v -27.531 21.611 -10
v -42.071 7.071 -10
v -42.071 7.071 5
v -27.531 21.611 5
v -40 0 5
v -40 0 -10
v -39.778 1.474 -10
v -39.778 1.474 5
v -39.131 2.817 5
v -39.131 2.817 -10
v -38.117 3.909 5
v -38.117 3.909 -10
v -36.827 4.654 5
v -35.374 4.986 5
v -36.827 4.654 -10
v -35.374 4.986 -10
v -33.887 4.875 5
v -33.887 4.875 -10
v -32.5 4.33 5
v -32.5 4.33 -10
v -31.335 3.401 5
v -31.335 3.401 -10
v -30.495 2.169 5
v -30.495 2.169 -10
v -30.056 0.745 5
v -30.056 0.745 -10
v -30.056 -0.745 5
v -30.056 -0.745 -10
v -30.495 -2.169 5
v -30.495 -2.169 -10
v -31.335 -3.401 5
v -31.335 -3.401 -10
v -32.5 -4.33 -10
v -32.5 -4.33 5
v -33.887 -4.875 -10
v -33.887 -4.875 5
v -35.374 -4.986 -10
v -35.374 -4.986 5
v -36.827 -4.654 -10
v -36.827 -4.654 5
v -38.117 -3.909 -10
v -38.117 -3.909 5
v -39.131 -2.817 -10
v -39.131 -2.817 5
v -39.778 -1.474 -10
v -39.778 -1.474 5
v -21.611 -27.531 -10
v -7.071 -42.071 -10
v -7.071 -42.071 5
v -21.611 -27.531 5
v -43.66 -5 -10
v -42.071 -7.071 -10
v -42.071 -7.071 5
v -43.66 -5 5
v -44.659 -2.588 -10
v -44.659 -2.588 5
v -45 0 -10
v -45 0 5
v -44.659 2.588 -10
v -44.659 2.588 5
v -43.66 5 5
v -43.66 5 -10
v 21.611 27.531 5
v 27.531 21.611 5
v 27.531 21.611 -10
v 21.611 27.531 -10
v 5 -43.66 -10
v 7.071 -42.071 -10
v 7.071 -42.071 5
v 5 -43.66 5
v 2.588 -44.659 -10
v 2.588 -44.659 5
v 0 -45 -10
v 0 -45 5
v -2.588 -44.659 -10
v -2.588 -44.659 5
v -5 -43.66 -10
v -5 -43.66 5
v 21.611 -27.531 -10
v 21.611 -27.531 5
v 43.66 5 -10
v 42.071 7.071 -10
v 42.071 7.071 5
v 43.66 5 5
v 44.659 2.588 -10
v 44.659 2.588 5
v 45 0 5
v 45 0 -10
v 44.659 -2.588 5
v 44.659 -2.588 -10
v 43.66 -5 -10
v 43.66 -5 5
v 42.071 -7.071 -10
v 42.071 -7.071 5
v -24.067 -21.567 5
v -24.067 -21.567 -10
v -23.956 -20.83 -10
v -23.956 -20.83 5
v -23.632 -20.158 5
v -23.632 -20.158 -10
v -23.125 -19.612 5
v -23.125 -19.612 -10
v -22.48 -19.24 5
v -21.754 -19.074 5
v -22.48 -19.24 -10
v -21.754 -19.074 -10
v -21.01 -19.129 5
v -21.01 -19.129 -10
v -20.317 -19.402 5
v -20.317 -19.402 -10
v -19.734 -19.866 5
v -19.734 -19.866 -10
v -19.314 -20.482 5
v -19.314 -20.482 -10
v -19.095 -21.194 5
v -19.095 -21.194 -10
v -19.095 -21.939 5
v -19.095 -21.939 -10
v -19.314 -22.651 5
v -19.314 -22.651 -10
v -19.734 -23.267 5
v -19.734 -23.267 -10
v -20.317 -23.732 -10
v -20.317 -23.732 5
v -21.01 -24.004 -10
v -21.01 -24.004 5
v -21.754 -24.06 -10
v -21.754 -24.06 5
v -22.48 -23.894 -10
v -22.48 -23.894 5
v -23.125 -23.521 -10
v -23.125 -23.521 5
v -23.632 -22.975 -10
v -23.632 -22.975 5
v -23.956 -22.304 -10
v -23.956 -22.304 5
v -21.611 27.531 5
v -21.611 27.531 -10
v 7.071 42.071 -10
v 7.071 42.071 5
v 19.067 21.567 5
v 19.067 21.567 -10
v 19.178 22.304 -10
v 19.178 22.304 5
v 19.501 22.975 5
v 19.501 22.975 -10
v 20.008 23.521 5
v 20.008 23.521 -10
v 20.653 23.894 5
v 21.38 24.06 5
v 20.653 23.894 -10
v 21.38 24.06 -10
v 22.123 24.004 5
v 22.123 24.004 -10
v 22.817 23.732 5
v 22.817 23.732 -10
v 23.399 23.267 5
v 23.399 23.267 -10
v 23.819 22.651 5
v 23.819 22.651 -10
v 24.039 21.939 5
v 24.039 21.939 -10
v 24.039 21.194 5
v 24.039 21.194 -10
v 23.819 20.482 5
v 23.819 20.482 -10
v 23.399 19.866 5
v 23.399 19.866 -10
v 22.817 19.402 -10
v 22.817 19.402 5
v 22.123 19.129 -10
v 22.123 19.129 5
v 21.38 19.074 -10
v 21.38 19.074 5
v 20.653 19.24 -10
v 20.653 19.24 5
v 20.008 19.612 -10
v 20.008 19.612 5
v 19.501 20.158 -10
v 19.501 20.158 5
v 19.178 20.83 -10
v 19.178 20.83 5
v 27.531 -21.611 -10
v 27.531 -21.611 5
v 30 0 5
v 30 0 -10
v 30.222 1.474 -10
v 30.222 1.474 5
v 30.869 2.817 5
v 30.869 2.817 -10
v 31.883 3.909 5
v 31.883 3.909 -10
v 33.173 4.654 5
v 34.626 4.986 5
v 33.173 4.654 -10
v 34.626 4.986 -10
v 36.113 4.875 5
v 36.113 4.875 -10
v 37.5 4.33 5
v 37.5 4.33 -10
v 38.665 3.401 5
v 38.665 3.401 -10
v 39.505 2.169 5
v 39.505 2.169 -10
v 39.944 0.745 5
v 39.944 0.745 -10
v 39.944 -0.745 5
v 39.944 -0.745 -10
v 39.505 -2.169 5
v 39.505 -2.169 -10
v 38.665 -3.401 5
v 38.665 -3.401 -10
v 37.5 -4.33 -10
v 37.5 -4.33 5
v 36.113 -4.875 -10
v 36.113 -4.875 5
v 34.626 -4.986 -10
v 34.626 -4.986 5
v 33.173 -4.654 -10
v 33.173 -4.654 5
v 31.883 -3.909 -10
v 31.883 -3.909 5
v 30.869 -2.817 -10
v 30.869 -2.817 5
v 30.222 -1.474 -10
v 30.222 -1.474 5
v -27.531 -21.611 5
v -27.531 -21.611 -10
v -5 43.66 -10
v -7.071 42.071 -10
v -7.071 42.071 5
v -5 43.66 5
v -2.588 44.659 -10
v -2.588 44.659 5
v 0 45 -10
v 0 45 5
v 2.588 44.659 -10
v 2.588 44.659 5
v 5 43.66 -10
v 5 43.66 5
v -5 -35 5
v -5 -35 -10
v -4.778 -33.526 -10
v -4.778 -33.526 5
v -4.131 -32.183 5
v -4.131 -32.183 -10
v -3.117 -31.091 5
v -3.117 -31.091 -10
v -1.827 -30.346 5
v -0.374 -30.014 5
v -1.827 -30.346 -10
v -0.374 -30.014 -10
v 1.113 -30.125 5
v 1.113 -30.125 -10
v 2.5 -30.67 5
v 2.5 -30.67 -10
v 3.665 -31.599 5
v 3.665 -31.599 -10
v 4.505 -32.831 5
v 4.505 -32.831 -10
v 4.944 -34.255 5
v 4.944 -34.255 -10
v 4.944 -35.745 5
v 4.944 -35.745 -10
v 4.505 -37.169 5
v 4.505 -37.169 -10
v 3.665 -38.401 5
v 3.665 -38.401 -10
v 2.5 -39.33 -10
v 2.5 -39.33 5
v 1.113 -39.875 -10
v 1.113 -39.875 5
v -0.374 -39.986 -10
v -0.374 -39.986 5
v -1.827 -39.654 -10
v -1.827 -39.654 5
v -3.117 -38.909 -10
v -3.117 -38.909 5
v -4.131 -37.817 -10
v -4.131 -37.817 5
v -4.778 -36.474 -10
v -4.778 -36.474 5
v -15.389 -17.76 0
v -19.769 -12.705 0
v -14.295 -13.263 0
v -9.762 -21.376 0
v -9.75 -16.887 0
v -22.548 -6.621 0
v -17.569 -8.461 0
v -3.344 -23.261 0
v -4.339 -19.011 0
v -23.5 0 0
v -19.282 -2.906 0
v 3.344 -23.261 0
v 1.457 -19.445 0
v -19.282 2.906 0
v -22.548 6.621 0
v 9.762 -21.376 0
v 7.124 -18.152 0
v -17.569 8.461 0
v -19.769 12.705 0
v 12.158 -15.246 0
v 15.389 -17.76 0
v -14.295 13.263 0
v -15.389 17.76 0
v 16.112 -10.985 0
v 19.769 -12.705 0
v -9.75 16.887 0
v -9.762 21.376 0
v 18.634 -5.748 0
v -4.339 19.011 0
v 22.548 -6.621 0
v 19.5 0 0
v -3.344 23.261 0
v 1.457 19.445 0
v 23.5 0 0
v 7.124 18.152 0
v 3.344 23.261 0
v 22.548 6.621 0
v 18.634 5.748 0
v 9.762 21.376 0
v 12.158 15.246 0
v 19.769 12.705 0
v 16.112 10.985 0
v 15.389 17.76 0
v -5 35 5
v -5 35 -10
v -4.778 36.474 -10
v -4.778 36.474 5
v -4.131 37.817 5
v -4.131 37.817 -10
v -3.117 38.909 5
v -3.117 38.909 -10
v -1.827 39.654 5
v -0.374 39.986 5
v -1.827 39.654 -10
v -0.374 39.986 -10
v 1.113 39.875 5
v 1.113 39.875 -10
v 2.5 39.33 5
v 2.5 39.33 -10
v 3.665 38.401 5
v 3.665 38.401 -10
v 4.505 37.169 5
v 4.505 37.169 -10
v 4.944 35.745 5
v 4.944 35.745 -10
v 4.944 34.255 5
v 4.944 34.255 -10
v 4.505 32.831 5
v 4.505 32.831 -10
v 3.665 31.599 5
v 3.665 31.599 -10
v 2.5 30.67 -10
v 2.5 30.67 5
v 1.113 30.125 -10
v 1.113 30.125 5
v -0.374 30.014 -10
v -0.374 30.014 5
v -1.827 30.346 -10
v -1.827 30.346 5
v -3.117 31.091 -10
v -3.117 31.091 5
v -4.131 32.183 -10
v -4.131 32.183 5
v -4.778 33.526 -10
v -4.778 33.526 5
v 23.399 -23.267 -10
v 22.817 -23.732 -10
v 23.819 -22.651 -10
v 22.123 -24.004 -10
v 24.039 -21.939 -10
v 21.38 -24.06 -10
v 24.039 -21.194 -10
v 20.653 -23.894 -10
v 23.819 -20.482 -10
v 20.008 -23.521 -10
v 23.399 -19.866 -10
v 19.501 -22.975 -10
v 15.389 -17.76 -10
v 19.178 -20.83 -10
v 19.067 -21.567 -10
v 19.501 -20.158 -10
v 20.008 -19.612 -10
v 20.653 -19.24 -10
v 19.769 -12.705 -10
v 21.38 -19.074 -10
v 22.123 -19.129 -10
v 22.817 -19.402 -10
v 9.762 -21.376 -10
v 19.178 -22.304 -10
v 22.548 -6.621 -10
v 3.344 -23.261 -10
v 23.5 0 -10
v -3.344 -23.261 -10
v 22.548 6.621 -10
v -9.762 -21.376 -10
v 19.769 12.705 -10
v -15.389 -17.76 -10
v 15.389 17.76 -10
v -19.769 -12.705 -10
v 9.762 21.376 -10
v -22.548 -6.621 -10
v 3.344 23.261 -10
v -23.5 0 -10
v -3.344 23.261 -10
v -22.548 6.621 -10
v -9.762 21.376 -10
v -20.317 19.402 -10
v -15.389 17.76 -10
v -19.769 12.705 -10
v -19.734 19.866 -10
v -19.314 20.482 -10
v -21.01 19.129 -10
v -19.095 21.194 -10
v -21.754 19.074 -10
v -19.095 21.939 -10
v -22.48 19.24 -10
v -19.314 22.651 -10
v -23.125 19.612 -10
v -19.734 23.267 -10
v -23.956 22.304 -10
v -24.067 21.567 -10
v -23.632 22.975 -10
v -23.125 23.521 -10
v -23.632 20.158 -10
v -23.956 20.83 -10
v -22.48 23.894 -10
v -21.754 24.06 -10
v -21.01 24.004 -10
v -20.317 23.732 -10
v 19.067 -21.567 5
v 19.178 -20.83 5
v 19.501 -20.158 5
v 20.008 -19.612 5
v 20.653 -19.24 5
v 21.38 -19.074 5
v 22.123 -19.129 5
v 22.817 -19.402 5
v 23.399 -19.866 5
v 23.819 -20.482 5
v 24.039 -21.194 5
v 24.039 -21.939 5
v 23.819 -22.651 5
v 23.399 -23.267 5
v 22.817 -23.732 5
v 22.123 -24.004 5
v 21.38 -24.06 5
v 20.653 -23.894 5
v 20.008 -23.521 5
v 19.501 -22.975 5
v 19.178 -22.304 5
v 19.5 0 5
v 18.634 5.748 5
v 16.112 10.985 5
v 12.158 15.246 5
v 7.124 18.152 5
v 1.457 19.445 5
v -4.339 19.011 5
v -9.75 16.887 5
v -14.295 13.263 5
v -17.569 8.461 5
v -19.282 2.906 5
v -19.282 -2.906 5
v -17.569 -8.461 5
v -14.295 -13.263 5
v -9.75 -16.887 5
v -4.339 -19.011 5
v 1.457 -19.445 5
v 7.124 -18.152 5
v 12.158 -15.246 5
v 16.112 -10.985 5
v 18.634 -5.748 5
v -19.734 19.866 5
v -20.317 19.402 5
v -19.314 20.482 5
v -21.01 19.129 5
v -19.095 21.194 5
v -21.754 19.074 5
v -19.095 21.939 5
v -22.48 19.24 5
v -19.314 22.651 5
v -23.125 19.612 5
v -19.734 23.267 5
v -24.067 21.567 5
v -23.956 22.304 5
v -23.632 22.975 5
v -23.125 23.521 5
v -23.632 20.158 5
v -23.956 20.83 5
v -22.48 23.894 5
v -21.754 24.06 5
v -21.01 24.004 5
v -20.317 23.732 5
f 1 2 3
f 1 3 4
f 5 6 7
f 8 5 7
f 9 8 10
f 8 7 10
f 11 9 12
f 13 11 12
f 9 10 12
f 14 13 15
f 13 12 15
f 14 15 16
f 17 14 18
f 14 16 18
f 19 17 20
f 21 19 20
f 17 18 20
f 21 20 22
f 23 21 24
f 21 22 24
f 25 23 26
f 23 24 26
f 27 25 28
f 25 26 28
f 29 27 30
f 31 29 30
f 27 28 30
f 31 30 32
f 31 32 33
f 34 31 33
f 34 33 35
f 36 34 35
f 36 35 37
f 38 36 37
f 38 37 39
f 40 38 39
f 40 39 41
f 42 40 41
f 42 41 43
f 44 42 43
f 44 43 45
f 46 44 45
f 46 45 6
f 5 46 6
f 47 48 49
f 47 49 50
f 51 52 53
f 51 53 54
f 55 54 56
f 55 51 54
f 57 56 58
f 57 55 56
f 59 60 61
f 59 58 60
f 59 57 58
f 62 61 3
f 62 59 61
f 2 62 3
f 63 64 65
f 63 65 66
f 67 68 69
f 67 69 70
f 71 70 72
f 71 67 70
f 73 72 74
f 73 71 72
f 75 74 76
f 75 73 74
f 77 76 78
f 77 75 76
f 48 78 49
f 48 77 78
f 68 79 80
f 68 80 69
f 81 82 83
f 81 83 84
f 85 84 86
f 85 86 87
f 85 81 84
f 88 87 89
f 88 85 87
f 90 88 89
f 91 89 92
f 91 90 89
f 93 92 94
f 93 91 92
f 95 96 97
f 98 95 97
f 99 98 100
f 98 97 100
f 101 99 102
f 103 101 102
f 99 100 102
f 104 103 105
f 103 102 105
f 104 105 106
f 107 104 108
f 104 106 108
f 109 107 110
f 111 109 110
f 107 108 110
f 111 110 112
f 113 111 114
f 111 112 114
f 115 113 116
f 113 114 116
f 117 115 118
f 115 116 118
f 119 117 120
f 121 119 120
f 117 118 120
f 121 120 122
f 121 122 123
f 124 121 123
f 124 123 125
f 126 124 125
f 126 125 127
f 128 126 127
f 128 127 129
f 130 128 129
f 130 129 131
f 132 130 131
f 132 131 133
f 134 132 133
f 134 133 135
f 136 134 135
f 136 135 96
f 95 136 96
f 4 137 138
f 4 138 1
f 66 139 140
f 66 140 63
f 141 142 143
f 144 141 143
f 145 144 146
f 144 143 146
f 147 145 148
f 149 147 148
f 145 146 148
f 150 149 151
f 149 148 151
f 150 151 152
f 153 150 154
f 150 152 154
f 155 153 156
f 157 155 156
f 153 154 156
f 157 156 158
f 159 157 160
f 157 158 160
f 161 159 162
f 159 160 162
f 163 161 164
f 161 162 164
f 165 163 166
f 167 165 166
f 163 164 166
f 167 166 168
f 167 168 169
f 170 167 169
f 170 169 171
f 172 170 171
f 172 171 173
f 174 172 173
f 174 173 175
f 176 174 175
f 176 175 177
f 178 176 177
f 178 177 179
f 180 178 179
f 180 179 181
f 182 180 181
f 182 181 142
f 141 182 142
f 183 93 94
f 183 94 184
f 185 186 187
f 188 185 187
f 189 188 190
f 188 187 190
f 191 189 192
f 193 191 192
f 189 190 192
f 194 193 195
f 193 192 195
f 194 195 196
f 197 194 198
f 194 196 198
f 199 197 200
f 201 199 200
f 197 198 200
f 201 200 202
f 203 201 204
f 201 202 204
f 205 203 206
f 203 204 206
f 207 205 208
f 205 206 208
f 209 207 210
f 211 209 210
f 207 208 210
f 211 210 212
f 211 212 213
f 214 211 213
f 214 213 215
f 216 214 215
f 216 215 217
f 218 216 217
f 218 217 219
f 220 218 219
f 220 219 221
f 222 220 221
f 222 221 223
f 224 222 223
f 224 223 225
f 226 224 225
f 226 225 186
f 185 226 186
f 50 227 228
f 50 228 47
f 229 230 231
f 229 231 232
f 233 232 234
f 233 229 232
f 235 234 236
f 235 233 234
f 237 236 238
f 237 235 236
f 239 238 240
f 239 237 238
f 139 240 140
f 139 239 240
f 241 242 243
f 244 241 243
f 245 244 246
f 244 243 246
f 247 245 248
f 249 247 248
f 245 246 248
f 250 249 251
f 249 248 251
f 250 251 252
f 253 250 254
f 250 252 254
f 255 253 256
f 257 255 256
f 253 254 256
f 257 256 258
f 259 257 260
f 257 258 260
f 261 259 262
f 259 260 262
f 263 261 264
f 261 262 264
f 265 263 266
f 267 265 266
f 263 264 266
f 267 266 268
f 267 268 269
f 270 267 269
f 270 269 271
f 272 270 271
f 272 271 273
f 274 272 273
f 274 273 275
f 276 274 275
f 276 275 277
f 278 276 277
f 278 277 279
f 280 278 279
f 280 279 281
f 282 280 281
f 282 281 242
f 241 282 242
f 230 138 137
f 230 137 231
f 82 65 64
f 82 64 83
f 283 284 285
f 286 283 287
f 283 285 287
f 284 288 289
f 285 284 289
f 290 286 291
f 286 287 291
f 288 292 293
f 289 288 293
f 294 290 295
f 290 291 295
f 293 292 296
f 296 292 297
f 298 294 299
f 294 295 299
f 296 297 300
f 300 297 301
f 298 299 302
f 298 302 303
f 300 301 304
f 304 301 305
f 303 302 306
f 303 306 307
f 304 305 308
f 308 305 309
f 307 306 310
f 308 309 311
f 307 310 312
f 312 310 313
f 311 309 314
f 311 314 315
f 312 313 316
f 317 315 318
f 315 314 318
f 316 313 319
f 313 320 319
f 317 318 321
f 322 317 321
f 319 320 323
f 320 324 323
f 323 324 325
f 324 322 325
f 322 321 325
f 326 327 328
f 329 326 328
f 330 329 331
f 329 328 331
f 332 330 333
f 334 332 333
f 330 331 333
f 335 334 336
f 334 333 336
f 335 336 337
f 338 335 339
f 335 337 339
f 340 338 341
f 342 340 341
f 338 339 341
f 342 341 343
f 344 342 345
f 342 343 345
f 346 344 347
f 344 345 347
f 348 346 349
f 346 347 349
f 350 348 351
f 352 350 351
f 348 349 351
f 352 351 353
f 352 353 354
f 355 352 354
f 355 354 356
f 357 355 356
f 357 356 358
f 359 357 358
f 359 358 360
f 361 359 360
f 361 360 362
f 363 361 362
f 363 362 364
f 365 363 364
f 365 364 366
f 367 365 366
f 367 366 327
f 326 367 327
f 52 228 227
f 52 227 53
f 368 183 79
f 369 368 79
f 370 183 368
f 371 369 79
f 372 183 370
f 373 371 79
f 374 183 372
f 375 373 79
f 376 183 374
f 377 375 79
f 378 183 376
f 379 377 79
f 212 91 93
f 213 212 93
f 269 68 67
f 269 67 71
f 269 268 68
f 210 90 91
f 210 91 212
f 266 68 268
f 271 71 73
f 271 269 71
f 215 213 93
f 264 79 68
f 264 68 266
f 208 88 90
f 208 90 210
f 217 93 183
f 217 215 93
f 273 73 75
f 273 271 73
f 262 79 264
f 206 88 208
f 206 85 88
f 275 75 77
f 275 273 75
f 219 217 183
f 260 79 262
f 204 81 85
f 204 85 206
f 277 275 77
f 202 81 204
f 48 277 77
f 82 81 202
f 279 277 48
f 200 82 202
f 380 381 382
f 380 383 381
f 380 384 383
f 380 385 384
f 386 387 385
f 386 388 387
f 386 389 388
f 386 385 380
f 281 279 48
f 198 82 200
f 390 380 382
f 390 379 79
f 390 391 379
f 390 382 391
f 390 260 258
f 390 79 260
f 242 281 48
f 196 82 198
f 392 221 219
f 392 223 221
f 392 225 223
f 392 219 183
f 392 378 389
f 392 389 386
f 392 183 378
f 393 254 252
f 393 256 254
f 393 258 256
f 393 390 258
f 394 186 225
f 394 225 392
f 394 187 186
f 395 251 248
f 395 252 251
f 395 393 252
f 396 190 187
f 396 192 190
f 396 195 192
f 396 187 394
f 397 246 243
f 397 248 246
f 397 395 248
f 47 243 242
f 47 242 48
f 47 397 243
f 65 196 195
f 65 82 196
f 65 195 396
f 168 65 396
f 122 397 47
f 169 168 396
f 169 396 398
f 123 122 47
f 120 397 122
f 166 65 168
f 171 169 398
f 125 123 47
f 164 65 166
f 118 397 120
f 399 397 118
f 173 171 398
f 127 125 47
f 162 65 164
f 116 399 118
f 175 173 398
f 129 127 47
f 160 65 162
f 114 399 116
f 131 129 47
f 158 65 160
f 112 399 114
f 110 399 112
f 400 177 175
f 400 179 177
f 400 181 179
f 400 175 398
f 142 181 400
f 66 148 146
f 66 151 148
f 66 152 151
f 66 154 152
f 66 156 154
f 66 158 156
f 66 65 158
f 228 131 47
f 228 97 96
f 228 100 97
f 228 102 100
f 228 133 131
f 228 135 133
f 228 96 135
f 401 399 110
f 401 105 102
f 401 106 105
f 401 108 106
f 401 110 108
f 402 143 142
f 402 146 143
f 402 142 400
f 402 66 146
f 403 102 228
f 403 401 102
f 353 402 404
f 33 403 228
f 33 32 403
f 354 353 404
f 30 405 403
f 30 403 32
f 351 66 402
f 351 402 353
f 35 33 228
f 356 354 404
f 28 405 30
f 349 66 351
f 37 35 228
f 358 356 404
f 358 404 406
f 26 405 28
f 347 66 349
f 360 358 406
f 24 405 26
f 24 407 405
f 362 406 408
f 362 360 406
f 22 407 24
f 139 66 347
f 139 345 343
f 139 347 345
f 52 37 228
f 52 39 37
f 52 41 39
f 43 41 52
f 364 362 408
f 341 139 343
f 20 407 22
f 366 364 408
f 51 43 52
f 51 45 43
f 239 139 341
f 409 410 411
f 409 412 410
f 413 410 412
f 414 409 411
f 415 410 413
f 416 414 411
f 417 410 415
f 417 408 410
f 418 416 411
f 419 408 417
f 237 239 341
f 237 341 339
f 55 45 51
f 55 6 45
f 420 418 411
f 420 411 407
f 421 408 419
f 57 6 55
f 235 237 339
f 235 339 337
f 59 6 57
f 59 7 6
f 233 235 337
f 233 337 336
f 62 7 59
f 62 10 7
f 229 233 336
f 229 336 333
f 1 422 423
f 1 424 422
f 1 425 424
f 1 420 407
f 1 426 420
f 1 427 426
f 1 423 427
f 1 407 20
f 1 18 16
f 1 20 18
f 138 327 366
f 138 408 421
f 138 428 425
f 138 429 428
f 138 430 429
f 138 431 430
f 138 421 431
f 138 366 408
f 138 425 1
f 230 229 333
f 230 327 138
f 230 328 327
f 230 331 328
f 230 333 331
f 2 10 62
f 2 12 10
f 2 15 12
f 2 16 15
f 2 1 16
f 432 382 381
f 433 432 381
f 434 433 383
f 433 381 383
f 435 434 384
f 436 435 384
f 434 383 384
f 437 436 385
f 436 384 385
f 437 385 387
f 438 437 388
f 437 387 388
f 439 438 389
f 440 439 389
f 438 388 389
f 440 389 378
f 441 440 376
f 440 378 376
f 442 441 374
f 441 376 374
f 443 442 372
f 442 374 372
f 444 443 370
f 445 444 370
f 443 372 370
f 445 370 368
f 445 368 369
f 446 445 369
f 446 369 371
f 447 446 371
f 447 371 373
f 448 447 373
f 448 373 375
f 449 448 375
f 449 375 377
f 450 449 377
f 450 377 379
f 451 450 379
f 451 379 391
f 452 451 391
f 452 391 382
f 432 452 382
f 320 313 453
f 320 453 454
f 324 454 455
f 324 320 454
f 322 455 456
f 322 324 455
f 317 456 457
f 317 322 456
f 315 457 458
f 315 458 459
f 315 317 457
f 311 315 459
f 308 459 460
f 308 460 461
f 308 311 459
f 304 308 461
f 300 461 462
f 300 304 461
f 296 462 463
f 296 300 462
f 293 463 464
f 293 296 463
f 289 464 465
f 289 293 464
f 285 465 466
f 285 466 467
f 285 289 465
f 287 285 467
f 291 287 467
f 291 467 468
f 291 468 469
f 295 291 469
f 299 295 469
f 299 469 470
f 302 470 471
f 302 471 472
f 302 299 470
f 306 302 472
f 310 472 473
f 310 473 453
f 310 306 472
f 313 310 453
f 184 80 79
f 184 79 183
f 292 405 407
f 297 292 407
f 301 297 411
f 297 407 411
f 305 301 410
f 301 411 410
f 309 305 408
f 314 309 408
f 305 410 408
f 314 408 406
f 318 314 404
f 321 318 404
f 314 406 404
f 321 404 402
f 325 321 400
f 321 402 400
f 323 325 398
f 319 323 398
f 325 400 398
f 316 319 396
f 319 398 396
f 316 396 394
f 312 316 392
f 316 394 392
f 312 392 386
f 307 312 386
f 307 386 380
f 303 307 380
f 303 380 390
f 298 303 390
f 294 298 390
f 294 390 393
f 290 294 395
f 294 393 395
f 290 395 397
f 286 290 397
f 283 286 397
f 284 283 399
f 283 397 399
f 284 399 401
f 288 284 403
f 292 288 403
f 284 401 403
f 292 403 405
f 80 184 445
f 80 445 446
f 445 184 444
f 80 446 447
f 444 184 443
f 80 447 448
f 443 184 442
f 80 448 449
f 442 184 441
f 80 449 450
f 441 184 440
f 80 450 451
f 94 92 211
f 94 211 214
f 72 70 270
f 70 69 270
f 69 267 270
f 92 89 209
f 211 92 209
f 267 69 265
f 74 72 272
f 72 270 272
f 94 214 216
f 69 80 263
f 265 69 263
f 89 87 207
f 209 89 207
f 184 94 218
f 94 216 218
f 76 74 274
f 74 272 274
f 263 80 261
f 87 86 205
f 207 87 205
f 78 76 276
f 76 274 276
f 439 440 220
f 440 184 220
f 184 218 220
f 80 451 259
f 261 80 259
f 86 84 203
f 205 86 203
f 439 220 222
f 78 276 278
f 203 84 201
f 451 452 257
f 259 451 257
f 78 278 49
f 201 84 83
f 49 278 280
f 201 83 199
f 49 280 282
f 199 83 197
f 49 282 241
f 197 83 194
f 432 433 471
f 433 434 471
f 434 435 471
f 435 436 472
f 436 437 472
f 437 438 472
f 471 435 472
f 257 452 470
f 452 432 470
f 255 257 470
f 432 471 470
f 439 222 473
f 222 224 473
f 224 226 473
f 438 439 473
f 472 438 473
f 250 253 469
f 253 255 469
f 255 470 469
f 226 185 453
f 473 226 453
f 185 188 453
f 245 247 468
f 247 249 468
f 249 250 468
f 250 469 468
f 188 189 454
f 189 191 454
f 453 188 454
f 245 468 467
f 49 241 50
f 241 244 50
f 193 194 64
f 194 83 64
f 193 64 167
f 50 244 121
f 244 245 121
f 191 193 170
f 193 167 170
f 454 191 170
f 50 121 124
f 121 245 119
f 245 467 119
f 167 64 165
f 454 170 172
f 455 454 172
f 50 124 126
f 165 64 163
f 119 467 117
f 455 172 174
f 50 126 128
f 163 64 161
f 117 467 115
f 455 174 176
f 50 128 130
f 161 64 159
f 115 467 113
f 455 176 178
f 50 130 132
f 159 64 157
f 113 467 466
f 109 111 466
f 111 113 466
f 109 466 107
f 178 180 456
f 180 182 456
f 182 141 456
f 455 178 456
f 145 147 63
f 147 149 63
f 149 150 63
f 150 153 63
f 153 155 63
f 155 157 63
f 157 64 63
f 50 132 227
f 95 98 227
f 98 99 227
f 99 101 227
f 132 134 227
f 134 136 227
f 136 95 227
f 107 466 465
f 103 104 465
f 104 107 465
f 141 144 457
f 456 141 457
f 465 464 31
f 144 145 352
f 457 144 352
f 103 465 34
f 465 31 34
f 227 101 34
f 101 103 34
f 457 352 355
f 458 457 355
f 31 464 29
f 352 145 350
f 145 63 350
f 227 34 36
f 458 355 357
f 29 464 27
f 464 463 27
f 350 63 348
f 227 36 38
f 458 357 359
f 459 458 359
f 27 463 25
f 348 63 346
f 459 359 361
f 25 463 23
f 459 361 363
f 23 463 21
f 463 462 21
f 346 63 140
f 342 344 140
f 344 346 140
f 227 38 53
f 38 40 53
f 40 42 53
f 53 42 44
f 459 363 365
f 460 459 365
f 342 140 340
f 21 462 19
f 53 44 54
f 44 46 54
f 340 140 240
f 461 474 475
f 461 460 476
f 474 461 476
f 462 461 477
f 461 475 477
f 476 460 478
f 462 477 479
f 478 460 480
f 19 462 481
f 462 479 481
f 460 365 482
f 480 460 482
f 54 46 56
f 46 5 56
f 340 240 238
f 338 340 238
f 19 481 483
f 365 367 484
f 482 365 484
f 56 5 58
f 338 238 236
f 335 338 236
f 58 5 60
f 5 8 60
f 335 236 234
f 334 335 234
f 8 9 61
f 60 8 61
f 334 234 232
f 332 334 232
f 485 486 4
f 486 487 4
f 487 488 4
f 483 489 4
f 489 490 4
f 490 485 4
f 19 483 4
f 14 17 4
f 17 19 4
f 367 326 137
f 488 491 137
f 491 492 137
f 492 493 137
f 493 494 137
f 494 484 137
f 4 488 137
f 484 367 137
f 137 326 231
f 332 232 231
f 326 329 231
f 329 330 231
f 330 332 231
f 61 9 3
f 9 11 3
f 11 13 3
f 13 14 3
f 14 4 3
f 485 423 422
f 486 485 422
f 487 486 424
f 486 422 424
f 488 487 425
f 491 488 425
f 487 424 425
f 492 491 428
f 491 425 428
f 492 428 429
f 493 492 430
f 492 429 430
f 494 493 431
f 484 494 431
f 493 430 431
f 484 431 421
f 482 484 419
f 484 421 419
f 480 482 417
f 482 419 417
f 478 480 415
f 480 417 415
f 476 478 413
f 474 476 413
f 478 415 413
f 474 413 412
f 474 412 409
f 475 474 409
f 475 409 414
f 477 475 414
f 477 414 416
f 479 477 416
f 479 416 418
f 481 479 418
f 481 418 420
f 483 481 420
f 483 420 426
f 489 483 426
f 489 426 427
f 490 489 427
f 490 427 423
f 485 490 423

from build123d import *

# Parameters (mm, degrees)
SZKIC1_R                    = 35
SZKIC1_R_2                  = 23.5
SZKIC1_R_3                  = 19.5
DODANIE_WYCI_GNI_CIE3_DEPTH = 5
DODANIE_WYCI_GNI_CIE5_START = 10
SZKIC4_R                    = 35
SZKIC4_R_2                  = 23.5
DODANIE_WYCI_GNI_CIE5_DEPTH = 10
SZKIC13_R                   = 10
DODANIE_WYCI_GNI_CIE6_DEPTH = 15
OTWORY_USTALAJ_CE_10_0MM1_D = 10
OTWORY_USTALAJ_CE_5_0MM3_D  = 5
DODANIE_WYCI_GNI_CIE7_DEPTH = 15
SZKIC28_R                   = 52.509364788
WYTNIJ_WYCI_GNI_CIE6_DEPTH  = 15


with BuildPart() as part:
    # Szkic1 → Dodanie-wyciągnięcie3 (new body)
    # profile 1 of 2: a face of its own
    with BuildSketch(Plane.XY):
        Circle(SZKIC1_R)
        Circle(SZKIC1_R_2, mode=Mode.SUBTRACT)
    # profile 2 of 2: a face of its own
    with BuildSketch(Plane.XY):
        Circle(SZKIC1_R_2)
        Circle(SZKIC1_R_3, mode=Mode.SUBTRACT)
    extrude(amount=DODANIE_WYCI_GNI_CIE3_DEPTH)

    # Szkic4 → Dodanie-wyciągnięcie5 (add)
    with BuildSketch(Plane(origin=(0, 0, 0), x_dir=(-1, 0, 0), z_dir=(0, 0, -1)).offset(DODANIE_WYCI_GNI_CIE5_START)):
        Circle(SZKIC4_R)
        Circle(SZKIC4_R_2, mode=Mode.SUBTRACT)
    extrude(amount=-DODANIE_WYCI_GNI_CIE5_DEPTH)

    # Szkic13 → Dodanie-wyciągnięcie6 (add)
    with BuildSketch(Plane(origin=(0, 0, -10), x_dir=(-1, 0, 0), z_dir=(0, 0, -1))):
        with Locations((0, 35)):
            Circle(SZKIC13_R)
        with Locations((0, -35)):
            Circle(SZKIC13_R)
        with Locations((-35, 0)):
            Circle(SZKIC13_R)
        with Locations((35, 0)):
            Circle(SZKIC13_R)
    extrude(amount=-DODANIE_WYCI_GNI_CIE6_DEPTH)

    # Otwory ustalające Ø10.0mm1 (through all)
    with Locations(Plane.XY.offset(5)):
        with Locations((0, 35), (0, -35), (-35, 0), (35, 0)):
            Hole(OTWORY_USTALAJ_CE_10_0MM1_D / 2)

    # Otwory ustalające Ø5.0mm3 (through all)
    with Locations(Plane.XY.offset(5)):
        with Locations((-21.566756826, 21.566756826), (21.566756826, 21.566756826), (21.566756826, -21.566756826), (-21.566756826, -21.566756826)):
            Hole(OTWORY_USTALAJ_CE_5_0MM3_D / 2)

    # Szkic27 → Dodanie-wyciągnięcie7 (add)
    with BuildSketch(Plane(origin=(0, 0, -10), x_dir=(-1, 0, 0), z_dir=(0, 0, -1))):
        with BuildLine():
            ThreePointArc((33.571428571, 9.897433186), (38.155396436, 9.48912395), (42.071067812, 7.071067812))
            Line((42.071067812, 7.071067812), (27.531241216, 21.610894407))
            ThreePointArc((27.531241216, 21.610894407), (31.107641461, 16.041029978), (33.571428571, 9.897433186))
        make_face()
        with BuildLine():
            ThreePointArc((9.897433186, 33.571428571), (16.041029978, 31.107641461), (21.610894407, 27.531241216))
            Line((21.610894407, 27.531241216), (7.071067812, 42.071067812))
            ThreePointArc((7.071067812, 42.071067812), (9.48912395, 38.155396436), (9.897433186, 33.571428571))
        make_face()
        with BuildLine():
            ThreePointArc((-9.897433186, 33.571428571), (-9.48912395, 38.155396436), (-7.071067812, 42.071067812))
            Line((-7.071067812, 42.071067812), (-21.610894407, 27.531241216))
            ThreePointArc((-21.610894407, 27.531241216), (-16.041029978, 31.107641461), (-9.897433186, 33.571428571))
        make_face()
        with BuildLine():
            ThreePointArc((-33.571428571, 9.897433186), (-31.107641461, 16.041029978), (-27.531241216, 21.610894407))
            Line((-27.531241216, 21.610894407), (-42.071067812, 7.071067812))
            ThreePointArc((-42.071067812, 7.071067812), (-38.155396436, 9.48912395), (-33.571428571, 9.897433186))
        make_face()
        with BuildLine():
            Line((-42.071067812, -7.071067812), (-27.531241216, -21.610894407))
            ThreePointArc((-27.531241216, -21.610894407), (-31.107641461, -16.041029978), (-33.571428571, -9.897433186))
            ThreePointArc((-33.571428571, -9.897433186), (-38.155396436, -9.48912395), (-42.071067812, -7.071067812))
        make_face()
        with BuildLine():
            Line((-21.610894407, -27.531241216), (-7.071067812, -42.071067812))
            ThreePointArc((-7.071067812, -42.071067812), (-9.48912395, -38.155396436), (-9.897433186, -33.571428571))
            ThreePointArc((-9.897433186, -33.571428571), (-16.041029978, -31.107641461), (-21.610894407, -27.531241216))
        make_face()
        with BuildLine():
            Line((7.071067812, -42.071067812), (21.610894407, -27.531241216))
            ThreePointArc((21.610894407, -27.531241216), (16.041029978, -31.107641461), (9.897433186, -33.571428571))
            ThreePointArc((9.897433186, -33.571428571), (9.48912395, -38.155396436), (7.071067812, -42.071067812))
        make_face()
        with BuildLine():
            Line((27.531241216, -21.610894407), (42.071067812, -7.071067812))
            ThreePointArc((42.071067812, -7.071067812), (38.155396436, -9.48912395), (33.571428571, -9.897433186))
            ThreePointArc((33.571428571, -9.897433186), (31.107641461, -16.041029978), (27.531241216, -21.610894407))
        make_face()
    extrude(amount=-DODANIE_WYCI_GNI_CIE7_DEPTH)

    # Szkic28 → Wytnij-wyciągnięcie6 (cut)
    # profile 1 of 5: a face of its own
    with BuildSketch(Plane(origin=(0, 0, -10), x_dir=(-1, 0, 0), z_dir=(0, 0, -1))):
        Circle(SZKIC28_R)
        with BuildLine():
            Line((49.142135624, 0), (42.071067812, -7.071067812))
            Line((42.071067812, -7.071067812), (41.070360041, -8.071775583))
            Line((41.070360041, -8.071775583), (27.531241216, -21.610894407))
            ThreePointArc((27.531241216, -21.610894407), (24.748737342, -24.748737342), (21.610894407, -27.531241216))
            Line((21.610894407, -27.531241216), (7.071067812, -42.071067812))
            Line((7.071067812, -42.071067812), (0, -49.142135624))
            Line((0, -49.142135624), (-7.071067812, -42.071067812))
            Line((-7.071067812, -42.071067812), (-21.610894407, -27.531241216))
            ThreePointArc((-21.610894407, -27.531241216), (-24.748737342, -24.748737342), (-27.531241216, -21.610894407))
            Line((-27.531241216, -21.610894407), (-42.071067812, -7.071067812))
            Line((-42.071067812, -7.071067812), (-49.142135624, 0))
            Line((-49.142135624, 0), (-42.071067812, 7.071067812))
            Line((-42.071067812, 7.071067812), (-27.531241216, 21.610894407))
            ThreePointArc((-27.531241216, 21.610894407), (-24.748737342, 24.748737342), (-21.610894407, 27.531241216))
            Line((-21.610894407, 27.531241216), (-7.071067812, 42.071067812))
            Line((-7.071067812, 42.071067812), (0, 49.142135624))
            Line((0, 49.142135624), (7.071067812, 42.071067812))
            Line((7.071067812, 42.071067812), (21.610894407, 27.531241216))
            ThreePointArc((21.610894407, 27.531241216), (24.748737342, 24.748737342), (27.531241216, 21.610894407))
            Line((27.531241216, 21.610894407), (42.071067812, 7.071067812))
            Line((42.071067812, 7.071067812), (49.142135624, 0))
        make_face(mode=Mode.SUBTRACT)
    # profile 2 of 5: a face of its own
    with BuildSketch(Plane(origin=(0, 0, -10), x_dir=(-1, 0, 0), z_dir=(0, 0, -1))):
        with BuildLine():
            ThreePointArc((21.610894407, -27.531241216), (24.748737342, -24.748737342), (27.531241216, -21.610894407))
            Line((27.531241216, -21.610894407), (21.610894407, -27.531241216))
        make_face()
    # profile 3 of 5: a face of its own
    with BuildSketch(Plane(origin=(0, 0, -10), x_dir=(-1, 0, 0), z_dir=(0, 0, -1))):
        with BuildLine():
            ThreePointArc((-27.531241216, -21.610894407), (-24.748737342, -24.748737342), (-21.610894407, -27.531241216))
            Line((-21.610894407, -27.531241216), (-27.531241216, -21.610894407))
        make_face()
    # profile 4 of 5: a face of its own
    with BuildSketch(Plane(origin=(0, 0, -10), x_dir=(-1, 0, 0), z_dir=(0, 0, -1))):
        with BuildLine():
            Line((-27.531241216, 21.610894407), (-21.610894407, 27.531241216))
            ThreePointArc((-21.610894407, 27.531241216), (-24.748737342, 24.748737342), (-27.531241216, 21.610894407))
        make_face()
    # profile 5 of 5: a face of its own
    with BuildSketch(Plane(origin=(0, 0, -10), x_dir=(-1, 0, 0), z_dir=(0, 0, -1))):
        with BuildLine():
            Line((21.610894407, 27.531241216), (27.531241216, 21.610894407))
            ThreePointArc((27.531241216, 21.610894407), (24.748737342, 24.748737342), (21.610894407, 27.531241216))
        make_face()
    extrude(amount=-WYTNIJ_WYCI_GNI_CIE6_DEPTH, mode=Mode.SUBTRACT)


solid = part.part
